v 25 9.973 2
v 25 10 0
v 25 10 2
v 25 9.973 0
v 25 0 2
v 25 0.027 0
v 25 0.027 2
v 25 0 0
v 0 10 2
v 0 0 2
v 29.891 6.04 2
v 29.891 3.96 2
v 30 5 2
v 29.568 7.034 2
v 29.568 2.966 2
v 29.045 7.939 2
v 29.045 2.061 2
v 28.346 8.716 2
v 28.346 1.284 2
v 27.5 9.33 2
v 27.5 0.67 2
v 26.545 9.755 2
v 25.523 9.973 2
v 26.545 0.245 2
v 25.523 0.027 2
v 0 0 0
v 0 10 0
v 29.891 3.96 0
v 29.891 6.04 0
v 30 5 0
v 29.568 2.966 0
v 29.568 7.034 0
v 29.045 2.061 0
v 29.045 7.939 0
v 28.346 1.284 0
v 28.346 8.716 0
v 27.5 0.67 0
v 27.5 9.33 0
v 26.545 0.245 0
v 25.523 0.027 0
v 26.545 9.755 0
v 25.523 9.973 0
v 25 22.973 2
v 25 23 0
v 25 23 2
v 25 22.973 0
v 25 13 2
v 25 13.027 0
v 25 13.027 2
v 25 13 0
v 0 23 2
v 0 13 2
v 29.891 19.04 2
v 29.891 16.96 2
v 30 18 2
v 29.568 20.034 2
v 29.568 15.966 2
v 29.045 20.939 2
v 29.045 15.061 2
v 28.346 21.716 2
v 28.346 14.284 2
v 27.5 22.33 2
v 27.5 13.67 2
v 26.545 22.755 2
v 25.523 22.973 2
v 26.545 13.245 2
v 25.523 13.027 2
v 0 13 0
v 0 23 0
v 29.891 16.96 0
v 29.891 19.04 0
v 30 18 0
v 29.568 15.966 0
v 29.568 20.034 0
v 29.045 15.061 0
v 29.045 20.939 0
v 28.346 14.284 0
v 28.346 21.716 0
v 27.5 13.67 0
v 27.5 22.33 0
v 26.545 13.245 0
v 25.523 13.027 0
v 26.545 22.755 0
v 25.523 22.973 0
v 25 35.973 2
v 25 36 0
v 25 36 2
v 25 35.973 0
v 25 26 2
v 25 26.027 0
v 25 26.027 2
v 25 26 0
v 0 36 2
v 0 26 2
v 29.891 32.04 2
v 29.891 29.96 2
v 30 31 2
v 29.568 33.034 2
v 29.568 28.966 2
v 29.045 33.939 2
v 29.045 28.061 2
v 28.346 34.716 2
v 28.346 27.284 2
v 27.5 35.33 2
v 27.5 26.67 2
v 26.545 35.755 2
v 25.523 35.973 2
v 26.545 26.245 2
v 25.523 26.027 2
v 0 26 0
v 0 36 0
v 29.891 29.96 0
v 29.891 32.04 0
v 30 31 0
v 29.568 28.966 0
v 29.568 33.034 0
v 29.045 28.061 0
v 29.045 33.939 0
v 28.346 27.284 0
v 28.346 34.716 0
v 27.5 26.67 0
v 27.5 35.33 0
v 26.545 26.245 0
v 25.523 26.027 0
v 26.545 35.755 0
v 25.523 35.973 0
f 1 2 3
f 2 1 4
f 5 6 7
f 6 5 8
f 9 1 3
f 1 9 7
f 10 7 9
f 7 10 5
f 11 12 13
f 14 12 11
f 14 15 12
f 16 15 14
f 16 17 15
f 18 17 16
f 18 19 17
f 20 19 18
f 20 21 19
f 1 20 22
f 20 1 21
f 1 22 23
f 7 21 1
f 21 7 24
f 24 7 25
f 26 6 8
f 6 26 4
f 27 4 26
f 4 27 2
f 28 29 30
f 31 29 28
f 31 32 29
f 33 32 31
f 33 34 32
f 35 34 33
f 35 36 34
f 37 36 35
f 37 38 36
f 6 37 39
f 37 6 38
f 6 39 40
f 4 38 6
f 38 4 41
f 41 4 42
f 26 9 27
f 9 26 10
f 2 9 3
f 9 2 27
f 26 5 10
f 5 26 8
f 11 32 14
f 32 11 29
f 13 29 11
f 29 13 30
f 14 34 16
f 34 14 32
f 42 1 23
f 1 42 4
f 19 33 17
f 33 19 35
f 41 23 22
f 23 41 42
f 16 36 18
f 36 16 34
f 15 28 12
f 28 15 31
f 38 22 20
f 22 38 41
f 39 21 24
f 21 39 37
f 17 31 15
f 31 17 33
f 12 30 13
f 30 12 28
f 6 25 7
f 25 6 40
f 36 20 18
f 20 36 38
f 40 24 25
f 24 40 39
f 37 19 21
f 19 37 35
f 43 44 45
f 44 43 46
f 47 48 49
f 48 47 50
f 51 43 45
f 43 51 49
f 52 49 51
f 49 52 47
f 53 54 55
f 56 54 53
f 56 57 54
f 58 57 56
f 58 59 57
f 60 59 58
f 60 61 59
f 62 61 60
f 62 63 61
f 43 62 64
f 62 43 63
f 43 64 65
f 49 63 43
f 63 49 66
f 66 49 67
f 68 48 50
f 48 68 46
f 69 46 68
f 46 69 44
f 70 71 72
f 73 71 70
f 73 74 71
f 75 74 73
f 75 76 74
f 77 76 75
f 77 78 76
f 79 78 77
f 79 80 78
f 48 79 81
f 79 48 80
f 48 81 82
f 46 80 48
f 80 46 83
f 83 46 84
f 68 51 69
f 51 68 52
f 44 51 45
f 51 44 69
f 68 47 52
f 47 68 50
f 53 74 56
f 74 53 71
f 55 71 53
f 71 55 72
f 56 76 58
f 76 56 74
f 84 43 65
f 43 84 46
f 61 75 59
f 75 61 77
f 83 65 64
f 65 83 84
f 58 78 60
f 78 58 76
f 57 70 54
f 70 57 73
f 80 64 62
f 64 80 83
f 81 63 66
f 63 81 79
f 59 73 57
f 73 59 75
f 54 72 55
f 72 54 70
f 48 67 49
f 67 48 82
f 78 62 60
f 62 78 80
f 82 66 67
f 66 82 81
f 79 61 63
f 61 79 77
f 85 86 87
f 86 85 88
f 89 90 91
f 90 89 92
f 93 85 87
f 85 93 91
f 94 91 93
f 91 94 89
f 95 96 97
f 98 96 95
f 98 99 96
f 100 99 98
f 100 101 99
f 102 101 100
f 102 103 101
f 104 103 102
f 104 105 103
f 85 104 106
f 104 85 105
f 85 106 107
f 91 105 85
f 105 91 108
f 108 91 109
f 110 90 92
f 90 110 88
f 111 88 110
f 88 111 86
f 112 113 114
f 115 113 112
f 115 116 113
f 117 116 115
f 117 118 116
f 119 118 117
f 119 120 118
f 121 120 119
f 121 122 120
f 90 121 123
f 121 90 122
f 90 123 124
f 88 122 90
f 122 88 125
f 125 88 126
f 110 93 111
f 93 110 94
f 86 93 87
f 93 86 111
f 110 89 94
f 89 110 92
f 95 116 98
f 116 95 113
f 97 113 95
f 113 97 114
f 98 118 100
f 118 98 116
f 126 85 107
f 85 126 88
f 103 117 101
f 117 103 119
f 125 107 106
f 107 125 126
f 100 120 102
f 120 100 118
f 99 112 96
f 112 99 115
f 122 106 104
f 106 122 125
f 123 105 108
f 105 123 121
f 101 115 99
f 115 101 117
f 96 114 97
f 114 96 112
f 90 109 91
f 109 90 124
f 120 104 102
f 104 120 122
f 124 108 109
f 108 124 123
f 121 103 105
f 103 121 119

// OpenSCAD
h=2;
count=3;

module extension()
{
  cube([25,10,h]);
  translate([25,5,0])
    cylinder(h=h, r=5, $fs=0.1);
}

for(x=[0:2])
  translate([0, x*13, 0])
    extension();
